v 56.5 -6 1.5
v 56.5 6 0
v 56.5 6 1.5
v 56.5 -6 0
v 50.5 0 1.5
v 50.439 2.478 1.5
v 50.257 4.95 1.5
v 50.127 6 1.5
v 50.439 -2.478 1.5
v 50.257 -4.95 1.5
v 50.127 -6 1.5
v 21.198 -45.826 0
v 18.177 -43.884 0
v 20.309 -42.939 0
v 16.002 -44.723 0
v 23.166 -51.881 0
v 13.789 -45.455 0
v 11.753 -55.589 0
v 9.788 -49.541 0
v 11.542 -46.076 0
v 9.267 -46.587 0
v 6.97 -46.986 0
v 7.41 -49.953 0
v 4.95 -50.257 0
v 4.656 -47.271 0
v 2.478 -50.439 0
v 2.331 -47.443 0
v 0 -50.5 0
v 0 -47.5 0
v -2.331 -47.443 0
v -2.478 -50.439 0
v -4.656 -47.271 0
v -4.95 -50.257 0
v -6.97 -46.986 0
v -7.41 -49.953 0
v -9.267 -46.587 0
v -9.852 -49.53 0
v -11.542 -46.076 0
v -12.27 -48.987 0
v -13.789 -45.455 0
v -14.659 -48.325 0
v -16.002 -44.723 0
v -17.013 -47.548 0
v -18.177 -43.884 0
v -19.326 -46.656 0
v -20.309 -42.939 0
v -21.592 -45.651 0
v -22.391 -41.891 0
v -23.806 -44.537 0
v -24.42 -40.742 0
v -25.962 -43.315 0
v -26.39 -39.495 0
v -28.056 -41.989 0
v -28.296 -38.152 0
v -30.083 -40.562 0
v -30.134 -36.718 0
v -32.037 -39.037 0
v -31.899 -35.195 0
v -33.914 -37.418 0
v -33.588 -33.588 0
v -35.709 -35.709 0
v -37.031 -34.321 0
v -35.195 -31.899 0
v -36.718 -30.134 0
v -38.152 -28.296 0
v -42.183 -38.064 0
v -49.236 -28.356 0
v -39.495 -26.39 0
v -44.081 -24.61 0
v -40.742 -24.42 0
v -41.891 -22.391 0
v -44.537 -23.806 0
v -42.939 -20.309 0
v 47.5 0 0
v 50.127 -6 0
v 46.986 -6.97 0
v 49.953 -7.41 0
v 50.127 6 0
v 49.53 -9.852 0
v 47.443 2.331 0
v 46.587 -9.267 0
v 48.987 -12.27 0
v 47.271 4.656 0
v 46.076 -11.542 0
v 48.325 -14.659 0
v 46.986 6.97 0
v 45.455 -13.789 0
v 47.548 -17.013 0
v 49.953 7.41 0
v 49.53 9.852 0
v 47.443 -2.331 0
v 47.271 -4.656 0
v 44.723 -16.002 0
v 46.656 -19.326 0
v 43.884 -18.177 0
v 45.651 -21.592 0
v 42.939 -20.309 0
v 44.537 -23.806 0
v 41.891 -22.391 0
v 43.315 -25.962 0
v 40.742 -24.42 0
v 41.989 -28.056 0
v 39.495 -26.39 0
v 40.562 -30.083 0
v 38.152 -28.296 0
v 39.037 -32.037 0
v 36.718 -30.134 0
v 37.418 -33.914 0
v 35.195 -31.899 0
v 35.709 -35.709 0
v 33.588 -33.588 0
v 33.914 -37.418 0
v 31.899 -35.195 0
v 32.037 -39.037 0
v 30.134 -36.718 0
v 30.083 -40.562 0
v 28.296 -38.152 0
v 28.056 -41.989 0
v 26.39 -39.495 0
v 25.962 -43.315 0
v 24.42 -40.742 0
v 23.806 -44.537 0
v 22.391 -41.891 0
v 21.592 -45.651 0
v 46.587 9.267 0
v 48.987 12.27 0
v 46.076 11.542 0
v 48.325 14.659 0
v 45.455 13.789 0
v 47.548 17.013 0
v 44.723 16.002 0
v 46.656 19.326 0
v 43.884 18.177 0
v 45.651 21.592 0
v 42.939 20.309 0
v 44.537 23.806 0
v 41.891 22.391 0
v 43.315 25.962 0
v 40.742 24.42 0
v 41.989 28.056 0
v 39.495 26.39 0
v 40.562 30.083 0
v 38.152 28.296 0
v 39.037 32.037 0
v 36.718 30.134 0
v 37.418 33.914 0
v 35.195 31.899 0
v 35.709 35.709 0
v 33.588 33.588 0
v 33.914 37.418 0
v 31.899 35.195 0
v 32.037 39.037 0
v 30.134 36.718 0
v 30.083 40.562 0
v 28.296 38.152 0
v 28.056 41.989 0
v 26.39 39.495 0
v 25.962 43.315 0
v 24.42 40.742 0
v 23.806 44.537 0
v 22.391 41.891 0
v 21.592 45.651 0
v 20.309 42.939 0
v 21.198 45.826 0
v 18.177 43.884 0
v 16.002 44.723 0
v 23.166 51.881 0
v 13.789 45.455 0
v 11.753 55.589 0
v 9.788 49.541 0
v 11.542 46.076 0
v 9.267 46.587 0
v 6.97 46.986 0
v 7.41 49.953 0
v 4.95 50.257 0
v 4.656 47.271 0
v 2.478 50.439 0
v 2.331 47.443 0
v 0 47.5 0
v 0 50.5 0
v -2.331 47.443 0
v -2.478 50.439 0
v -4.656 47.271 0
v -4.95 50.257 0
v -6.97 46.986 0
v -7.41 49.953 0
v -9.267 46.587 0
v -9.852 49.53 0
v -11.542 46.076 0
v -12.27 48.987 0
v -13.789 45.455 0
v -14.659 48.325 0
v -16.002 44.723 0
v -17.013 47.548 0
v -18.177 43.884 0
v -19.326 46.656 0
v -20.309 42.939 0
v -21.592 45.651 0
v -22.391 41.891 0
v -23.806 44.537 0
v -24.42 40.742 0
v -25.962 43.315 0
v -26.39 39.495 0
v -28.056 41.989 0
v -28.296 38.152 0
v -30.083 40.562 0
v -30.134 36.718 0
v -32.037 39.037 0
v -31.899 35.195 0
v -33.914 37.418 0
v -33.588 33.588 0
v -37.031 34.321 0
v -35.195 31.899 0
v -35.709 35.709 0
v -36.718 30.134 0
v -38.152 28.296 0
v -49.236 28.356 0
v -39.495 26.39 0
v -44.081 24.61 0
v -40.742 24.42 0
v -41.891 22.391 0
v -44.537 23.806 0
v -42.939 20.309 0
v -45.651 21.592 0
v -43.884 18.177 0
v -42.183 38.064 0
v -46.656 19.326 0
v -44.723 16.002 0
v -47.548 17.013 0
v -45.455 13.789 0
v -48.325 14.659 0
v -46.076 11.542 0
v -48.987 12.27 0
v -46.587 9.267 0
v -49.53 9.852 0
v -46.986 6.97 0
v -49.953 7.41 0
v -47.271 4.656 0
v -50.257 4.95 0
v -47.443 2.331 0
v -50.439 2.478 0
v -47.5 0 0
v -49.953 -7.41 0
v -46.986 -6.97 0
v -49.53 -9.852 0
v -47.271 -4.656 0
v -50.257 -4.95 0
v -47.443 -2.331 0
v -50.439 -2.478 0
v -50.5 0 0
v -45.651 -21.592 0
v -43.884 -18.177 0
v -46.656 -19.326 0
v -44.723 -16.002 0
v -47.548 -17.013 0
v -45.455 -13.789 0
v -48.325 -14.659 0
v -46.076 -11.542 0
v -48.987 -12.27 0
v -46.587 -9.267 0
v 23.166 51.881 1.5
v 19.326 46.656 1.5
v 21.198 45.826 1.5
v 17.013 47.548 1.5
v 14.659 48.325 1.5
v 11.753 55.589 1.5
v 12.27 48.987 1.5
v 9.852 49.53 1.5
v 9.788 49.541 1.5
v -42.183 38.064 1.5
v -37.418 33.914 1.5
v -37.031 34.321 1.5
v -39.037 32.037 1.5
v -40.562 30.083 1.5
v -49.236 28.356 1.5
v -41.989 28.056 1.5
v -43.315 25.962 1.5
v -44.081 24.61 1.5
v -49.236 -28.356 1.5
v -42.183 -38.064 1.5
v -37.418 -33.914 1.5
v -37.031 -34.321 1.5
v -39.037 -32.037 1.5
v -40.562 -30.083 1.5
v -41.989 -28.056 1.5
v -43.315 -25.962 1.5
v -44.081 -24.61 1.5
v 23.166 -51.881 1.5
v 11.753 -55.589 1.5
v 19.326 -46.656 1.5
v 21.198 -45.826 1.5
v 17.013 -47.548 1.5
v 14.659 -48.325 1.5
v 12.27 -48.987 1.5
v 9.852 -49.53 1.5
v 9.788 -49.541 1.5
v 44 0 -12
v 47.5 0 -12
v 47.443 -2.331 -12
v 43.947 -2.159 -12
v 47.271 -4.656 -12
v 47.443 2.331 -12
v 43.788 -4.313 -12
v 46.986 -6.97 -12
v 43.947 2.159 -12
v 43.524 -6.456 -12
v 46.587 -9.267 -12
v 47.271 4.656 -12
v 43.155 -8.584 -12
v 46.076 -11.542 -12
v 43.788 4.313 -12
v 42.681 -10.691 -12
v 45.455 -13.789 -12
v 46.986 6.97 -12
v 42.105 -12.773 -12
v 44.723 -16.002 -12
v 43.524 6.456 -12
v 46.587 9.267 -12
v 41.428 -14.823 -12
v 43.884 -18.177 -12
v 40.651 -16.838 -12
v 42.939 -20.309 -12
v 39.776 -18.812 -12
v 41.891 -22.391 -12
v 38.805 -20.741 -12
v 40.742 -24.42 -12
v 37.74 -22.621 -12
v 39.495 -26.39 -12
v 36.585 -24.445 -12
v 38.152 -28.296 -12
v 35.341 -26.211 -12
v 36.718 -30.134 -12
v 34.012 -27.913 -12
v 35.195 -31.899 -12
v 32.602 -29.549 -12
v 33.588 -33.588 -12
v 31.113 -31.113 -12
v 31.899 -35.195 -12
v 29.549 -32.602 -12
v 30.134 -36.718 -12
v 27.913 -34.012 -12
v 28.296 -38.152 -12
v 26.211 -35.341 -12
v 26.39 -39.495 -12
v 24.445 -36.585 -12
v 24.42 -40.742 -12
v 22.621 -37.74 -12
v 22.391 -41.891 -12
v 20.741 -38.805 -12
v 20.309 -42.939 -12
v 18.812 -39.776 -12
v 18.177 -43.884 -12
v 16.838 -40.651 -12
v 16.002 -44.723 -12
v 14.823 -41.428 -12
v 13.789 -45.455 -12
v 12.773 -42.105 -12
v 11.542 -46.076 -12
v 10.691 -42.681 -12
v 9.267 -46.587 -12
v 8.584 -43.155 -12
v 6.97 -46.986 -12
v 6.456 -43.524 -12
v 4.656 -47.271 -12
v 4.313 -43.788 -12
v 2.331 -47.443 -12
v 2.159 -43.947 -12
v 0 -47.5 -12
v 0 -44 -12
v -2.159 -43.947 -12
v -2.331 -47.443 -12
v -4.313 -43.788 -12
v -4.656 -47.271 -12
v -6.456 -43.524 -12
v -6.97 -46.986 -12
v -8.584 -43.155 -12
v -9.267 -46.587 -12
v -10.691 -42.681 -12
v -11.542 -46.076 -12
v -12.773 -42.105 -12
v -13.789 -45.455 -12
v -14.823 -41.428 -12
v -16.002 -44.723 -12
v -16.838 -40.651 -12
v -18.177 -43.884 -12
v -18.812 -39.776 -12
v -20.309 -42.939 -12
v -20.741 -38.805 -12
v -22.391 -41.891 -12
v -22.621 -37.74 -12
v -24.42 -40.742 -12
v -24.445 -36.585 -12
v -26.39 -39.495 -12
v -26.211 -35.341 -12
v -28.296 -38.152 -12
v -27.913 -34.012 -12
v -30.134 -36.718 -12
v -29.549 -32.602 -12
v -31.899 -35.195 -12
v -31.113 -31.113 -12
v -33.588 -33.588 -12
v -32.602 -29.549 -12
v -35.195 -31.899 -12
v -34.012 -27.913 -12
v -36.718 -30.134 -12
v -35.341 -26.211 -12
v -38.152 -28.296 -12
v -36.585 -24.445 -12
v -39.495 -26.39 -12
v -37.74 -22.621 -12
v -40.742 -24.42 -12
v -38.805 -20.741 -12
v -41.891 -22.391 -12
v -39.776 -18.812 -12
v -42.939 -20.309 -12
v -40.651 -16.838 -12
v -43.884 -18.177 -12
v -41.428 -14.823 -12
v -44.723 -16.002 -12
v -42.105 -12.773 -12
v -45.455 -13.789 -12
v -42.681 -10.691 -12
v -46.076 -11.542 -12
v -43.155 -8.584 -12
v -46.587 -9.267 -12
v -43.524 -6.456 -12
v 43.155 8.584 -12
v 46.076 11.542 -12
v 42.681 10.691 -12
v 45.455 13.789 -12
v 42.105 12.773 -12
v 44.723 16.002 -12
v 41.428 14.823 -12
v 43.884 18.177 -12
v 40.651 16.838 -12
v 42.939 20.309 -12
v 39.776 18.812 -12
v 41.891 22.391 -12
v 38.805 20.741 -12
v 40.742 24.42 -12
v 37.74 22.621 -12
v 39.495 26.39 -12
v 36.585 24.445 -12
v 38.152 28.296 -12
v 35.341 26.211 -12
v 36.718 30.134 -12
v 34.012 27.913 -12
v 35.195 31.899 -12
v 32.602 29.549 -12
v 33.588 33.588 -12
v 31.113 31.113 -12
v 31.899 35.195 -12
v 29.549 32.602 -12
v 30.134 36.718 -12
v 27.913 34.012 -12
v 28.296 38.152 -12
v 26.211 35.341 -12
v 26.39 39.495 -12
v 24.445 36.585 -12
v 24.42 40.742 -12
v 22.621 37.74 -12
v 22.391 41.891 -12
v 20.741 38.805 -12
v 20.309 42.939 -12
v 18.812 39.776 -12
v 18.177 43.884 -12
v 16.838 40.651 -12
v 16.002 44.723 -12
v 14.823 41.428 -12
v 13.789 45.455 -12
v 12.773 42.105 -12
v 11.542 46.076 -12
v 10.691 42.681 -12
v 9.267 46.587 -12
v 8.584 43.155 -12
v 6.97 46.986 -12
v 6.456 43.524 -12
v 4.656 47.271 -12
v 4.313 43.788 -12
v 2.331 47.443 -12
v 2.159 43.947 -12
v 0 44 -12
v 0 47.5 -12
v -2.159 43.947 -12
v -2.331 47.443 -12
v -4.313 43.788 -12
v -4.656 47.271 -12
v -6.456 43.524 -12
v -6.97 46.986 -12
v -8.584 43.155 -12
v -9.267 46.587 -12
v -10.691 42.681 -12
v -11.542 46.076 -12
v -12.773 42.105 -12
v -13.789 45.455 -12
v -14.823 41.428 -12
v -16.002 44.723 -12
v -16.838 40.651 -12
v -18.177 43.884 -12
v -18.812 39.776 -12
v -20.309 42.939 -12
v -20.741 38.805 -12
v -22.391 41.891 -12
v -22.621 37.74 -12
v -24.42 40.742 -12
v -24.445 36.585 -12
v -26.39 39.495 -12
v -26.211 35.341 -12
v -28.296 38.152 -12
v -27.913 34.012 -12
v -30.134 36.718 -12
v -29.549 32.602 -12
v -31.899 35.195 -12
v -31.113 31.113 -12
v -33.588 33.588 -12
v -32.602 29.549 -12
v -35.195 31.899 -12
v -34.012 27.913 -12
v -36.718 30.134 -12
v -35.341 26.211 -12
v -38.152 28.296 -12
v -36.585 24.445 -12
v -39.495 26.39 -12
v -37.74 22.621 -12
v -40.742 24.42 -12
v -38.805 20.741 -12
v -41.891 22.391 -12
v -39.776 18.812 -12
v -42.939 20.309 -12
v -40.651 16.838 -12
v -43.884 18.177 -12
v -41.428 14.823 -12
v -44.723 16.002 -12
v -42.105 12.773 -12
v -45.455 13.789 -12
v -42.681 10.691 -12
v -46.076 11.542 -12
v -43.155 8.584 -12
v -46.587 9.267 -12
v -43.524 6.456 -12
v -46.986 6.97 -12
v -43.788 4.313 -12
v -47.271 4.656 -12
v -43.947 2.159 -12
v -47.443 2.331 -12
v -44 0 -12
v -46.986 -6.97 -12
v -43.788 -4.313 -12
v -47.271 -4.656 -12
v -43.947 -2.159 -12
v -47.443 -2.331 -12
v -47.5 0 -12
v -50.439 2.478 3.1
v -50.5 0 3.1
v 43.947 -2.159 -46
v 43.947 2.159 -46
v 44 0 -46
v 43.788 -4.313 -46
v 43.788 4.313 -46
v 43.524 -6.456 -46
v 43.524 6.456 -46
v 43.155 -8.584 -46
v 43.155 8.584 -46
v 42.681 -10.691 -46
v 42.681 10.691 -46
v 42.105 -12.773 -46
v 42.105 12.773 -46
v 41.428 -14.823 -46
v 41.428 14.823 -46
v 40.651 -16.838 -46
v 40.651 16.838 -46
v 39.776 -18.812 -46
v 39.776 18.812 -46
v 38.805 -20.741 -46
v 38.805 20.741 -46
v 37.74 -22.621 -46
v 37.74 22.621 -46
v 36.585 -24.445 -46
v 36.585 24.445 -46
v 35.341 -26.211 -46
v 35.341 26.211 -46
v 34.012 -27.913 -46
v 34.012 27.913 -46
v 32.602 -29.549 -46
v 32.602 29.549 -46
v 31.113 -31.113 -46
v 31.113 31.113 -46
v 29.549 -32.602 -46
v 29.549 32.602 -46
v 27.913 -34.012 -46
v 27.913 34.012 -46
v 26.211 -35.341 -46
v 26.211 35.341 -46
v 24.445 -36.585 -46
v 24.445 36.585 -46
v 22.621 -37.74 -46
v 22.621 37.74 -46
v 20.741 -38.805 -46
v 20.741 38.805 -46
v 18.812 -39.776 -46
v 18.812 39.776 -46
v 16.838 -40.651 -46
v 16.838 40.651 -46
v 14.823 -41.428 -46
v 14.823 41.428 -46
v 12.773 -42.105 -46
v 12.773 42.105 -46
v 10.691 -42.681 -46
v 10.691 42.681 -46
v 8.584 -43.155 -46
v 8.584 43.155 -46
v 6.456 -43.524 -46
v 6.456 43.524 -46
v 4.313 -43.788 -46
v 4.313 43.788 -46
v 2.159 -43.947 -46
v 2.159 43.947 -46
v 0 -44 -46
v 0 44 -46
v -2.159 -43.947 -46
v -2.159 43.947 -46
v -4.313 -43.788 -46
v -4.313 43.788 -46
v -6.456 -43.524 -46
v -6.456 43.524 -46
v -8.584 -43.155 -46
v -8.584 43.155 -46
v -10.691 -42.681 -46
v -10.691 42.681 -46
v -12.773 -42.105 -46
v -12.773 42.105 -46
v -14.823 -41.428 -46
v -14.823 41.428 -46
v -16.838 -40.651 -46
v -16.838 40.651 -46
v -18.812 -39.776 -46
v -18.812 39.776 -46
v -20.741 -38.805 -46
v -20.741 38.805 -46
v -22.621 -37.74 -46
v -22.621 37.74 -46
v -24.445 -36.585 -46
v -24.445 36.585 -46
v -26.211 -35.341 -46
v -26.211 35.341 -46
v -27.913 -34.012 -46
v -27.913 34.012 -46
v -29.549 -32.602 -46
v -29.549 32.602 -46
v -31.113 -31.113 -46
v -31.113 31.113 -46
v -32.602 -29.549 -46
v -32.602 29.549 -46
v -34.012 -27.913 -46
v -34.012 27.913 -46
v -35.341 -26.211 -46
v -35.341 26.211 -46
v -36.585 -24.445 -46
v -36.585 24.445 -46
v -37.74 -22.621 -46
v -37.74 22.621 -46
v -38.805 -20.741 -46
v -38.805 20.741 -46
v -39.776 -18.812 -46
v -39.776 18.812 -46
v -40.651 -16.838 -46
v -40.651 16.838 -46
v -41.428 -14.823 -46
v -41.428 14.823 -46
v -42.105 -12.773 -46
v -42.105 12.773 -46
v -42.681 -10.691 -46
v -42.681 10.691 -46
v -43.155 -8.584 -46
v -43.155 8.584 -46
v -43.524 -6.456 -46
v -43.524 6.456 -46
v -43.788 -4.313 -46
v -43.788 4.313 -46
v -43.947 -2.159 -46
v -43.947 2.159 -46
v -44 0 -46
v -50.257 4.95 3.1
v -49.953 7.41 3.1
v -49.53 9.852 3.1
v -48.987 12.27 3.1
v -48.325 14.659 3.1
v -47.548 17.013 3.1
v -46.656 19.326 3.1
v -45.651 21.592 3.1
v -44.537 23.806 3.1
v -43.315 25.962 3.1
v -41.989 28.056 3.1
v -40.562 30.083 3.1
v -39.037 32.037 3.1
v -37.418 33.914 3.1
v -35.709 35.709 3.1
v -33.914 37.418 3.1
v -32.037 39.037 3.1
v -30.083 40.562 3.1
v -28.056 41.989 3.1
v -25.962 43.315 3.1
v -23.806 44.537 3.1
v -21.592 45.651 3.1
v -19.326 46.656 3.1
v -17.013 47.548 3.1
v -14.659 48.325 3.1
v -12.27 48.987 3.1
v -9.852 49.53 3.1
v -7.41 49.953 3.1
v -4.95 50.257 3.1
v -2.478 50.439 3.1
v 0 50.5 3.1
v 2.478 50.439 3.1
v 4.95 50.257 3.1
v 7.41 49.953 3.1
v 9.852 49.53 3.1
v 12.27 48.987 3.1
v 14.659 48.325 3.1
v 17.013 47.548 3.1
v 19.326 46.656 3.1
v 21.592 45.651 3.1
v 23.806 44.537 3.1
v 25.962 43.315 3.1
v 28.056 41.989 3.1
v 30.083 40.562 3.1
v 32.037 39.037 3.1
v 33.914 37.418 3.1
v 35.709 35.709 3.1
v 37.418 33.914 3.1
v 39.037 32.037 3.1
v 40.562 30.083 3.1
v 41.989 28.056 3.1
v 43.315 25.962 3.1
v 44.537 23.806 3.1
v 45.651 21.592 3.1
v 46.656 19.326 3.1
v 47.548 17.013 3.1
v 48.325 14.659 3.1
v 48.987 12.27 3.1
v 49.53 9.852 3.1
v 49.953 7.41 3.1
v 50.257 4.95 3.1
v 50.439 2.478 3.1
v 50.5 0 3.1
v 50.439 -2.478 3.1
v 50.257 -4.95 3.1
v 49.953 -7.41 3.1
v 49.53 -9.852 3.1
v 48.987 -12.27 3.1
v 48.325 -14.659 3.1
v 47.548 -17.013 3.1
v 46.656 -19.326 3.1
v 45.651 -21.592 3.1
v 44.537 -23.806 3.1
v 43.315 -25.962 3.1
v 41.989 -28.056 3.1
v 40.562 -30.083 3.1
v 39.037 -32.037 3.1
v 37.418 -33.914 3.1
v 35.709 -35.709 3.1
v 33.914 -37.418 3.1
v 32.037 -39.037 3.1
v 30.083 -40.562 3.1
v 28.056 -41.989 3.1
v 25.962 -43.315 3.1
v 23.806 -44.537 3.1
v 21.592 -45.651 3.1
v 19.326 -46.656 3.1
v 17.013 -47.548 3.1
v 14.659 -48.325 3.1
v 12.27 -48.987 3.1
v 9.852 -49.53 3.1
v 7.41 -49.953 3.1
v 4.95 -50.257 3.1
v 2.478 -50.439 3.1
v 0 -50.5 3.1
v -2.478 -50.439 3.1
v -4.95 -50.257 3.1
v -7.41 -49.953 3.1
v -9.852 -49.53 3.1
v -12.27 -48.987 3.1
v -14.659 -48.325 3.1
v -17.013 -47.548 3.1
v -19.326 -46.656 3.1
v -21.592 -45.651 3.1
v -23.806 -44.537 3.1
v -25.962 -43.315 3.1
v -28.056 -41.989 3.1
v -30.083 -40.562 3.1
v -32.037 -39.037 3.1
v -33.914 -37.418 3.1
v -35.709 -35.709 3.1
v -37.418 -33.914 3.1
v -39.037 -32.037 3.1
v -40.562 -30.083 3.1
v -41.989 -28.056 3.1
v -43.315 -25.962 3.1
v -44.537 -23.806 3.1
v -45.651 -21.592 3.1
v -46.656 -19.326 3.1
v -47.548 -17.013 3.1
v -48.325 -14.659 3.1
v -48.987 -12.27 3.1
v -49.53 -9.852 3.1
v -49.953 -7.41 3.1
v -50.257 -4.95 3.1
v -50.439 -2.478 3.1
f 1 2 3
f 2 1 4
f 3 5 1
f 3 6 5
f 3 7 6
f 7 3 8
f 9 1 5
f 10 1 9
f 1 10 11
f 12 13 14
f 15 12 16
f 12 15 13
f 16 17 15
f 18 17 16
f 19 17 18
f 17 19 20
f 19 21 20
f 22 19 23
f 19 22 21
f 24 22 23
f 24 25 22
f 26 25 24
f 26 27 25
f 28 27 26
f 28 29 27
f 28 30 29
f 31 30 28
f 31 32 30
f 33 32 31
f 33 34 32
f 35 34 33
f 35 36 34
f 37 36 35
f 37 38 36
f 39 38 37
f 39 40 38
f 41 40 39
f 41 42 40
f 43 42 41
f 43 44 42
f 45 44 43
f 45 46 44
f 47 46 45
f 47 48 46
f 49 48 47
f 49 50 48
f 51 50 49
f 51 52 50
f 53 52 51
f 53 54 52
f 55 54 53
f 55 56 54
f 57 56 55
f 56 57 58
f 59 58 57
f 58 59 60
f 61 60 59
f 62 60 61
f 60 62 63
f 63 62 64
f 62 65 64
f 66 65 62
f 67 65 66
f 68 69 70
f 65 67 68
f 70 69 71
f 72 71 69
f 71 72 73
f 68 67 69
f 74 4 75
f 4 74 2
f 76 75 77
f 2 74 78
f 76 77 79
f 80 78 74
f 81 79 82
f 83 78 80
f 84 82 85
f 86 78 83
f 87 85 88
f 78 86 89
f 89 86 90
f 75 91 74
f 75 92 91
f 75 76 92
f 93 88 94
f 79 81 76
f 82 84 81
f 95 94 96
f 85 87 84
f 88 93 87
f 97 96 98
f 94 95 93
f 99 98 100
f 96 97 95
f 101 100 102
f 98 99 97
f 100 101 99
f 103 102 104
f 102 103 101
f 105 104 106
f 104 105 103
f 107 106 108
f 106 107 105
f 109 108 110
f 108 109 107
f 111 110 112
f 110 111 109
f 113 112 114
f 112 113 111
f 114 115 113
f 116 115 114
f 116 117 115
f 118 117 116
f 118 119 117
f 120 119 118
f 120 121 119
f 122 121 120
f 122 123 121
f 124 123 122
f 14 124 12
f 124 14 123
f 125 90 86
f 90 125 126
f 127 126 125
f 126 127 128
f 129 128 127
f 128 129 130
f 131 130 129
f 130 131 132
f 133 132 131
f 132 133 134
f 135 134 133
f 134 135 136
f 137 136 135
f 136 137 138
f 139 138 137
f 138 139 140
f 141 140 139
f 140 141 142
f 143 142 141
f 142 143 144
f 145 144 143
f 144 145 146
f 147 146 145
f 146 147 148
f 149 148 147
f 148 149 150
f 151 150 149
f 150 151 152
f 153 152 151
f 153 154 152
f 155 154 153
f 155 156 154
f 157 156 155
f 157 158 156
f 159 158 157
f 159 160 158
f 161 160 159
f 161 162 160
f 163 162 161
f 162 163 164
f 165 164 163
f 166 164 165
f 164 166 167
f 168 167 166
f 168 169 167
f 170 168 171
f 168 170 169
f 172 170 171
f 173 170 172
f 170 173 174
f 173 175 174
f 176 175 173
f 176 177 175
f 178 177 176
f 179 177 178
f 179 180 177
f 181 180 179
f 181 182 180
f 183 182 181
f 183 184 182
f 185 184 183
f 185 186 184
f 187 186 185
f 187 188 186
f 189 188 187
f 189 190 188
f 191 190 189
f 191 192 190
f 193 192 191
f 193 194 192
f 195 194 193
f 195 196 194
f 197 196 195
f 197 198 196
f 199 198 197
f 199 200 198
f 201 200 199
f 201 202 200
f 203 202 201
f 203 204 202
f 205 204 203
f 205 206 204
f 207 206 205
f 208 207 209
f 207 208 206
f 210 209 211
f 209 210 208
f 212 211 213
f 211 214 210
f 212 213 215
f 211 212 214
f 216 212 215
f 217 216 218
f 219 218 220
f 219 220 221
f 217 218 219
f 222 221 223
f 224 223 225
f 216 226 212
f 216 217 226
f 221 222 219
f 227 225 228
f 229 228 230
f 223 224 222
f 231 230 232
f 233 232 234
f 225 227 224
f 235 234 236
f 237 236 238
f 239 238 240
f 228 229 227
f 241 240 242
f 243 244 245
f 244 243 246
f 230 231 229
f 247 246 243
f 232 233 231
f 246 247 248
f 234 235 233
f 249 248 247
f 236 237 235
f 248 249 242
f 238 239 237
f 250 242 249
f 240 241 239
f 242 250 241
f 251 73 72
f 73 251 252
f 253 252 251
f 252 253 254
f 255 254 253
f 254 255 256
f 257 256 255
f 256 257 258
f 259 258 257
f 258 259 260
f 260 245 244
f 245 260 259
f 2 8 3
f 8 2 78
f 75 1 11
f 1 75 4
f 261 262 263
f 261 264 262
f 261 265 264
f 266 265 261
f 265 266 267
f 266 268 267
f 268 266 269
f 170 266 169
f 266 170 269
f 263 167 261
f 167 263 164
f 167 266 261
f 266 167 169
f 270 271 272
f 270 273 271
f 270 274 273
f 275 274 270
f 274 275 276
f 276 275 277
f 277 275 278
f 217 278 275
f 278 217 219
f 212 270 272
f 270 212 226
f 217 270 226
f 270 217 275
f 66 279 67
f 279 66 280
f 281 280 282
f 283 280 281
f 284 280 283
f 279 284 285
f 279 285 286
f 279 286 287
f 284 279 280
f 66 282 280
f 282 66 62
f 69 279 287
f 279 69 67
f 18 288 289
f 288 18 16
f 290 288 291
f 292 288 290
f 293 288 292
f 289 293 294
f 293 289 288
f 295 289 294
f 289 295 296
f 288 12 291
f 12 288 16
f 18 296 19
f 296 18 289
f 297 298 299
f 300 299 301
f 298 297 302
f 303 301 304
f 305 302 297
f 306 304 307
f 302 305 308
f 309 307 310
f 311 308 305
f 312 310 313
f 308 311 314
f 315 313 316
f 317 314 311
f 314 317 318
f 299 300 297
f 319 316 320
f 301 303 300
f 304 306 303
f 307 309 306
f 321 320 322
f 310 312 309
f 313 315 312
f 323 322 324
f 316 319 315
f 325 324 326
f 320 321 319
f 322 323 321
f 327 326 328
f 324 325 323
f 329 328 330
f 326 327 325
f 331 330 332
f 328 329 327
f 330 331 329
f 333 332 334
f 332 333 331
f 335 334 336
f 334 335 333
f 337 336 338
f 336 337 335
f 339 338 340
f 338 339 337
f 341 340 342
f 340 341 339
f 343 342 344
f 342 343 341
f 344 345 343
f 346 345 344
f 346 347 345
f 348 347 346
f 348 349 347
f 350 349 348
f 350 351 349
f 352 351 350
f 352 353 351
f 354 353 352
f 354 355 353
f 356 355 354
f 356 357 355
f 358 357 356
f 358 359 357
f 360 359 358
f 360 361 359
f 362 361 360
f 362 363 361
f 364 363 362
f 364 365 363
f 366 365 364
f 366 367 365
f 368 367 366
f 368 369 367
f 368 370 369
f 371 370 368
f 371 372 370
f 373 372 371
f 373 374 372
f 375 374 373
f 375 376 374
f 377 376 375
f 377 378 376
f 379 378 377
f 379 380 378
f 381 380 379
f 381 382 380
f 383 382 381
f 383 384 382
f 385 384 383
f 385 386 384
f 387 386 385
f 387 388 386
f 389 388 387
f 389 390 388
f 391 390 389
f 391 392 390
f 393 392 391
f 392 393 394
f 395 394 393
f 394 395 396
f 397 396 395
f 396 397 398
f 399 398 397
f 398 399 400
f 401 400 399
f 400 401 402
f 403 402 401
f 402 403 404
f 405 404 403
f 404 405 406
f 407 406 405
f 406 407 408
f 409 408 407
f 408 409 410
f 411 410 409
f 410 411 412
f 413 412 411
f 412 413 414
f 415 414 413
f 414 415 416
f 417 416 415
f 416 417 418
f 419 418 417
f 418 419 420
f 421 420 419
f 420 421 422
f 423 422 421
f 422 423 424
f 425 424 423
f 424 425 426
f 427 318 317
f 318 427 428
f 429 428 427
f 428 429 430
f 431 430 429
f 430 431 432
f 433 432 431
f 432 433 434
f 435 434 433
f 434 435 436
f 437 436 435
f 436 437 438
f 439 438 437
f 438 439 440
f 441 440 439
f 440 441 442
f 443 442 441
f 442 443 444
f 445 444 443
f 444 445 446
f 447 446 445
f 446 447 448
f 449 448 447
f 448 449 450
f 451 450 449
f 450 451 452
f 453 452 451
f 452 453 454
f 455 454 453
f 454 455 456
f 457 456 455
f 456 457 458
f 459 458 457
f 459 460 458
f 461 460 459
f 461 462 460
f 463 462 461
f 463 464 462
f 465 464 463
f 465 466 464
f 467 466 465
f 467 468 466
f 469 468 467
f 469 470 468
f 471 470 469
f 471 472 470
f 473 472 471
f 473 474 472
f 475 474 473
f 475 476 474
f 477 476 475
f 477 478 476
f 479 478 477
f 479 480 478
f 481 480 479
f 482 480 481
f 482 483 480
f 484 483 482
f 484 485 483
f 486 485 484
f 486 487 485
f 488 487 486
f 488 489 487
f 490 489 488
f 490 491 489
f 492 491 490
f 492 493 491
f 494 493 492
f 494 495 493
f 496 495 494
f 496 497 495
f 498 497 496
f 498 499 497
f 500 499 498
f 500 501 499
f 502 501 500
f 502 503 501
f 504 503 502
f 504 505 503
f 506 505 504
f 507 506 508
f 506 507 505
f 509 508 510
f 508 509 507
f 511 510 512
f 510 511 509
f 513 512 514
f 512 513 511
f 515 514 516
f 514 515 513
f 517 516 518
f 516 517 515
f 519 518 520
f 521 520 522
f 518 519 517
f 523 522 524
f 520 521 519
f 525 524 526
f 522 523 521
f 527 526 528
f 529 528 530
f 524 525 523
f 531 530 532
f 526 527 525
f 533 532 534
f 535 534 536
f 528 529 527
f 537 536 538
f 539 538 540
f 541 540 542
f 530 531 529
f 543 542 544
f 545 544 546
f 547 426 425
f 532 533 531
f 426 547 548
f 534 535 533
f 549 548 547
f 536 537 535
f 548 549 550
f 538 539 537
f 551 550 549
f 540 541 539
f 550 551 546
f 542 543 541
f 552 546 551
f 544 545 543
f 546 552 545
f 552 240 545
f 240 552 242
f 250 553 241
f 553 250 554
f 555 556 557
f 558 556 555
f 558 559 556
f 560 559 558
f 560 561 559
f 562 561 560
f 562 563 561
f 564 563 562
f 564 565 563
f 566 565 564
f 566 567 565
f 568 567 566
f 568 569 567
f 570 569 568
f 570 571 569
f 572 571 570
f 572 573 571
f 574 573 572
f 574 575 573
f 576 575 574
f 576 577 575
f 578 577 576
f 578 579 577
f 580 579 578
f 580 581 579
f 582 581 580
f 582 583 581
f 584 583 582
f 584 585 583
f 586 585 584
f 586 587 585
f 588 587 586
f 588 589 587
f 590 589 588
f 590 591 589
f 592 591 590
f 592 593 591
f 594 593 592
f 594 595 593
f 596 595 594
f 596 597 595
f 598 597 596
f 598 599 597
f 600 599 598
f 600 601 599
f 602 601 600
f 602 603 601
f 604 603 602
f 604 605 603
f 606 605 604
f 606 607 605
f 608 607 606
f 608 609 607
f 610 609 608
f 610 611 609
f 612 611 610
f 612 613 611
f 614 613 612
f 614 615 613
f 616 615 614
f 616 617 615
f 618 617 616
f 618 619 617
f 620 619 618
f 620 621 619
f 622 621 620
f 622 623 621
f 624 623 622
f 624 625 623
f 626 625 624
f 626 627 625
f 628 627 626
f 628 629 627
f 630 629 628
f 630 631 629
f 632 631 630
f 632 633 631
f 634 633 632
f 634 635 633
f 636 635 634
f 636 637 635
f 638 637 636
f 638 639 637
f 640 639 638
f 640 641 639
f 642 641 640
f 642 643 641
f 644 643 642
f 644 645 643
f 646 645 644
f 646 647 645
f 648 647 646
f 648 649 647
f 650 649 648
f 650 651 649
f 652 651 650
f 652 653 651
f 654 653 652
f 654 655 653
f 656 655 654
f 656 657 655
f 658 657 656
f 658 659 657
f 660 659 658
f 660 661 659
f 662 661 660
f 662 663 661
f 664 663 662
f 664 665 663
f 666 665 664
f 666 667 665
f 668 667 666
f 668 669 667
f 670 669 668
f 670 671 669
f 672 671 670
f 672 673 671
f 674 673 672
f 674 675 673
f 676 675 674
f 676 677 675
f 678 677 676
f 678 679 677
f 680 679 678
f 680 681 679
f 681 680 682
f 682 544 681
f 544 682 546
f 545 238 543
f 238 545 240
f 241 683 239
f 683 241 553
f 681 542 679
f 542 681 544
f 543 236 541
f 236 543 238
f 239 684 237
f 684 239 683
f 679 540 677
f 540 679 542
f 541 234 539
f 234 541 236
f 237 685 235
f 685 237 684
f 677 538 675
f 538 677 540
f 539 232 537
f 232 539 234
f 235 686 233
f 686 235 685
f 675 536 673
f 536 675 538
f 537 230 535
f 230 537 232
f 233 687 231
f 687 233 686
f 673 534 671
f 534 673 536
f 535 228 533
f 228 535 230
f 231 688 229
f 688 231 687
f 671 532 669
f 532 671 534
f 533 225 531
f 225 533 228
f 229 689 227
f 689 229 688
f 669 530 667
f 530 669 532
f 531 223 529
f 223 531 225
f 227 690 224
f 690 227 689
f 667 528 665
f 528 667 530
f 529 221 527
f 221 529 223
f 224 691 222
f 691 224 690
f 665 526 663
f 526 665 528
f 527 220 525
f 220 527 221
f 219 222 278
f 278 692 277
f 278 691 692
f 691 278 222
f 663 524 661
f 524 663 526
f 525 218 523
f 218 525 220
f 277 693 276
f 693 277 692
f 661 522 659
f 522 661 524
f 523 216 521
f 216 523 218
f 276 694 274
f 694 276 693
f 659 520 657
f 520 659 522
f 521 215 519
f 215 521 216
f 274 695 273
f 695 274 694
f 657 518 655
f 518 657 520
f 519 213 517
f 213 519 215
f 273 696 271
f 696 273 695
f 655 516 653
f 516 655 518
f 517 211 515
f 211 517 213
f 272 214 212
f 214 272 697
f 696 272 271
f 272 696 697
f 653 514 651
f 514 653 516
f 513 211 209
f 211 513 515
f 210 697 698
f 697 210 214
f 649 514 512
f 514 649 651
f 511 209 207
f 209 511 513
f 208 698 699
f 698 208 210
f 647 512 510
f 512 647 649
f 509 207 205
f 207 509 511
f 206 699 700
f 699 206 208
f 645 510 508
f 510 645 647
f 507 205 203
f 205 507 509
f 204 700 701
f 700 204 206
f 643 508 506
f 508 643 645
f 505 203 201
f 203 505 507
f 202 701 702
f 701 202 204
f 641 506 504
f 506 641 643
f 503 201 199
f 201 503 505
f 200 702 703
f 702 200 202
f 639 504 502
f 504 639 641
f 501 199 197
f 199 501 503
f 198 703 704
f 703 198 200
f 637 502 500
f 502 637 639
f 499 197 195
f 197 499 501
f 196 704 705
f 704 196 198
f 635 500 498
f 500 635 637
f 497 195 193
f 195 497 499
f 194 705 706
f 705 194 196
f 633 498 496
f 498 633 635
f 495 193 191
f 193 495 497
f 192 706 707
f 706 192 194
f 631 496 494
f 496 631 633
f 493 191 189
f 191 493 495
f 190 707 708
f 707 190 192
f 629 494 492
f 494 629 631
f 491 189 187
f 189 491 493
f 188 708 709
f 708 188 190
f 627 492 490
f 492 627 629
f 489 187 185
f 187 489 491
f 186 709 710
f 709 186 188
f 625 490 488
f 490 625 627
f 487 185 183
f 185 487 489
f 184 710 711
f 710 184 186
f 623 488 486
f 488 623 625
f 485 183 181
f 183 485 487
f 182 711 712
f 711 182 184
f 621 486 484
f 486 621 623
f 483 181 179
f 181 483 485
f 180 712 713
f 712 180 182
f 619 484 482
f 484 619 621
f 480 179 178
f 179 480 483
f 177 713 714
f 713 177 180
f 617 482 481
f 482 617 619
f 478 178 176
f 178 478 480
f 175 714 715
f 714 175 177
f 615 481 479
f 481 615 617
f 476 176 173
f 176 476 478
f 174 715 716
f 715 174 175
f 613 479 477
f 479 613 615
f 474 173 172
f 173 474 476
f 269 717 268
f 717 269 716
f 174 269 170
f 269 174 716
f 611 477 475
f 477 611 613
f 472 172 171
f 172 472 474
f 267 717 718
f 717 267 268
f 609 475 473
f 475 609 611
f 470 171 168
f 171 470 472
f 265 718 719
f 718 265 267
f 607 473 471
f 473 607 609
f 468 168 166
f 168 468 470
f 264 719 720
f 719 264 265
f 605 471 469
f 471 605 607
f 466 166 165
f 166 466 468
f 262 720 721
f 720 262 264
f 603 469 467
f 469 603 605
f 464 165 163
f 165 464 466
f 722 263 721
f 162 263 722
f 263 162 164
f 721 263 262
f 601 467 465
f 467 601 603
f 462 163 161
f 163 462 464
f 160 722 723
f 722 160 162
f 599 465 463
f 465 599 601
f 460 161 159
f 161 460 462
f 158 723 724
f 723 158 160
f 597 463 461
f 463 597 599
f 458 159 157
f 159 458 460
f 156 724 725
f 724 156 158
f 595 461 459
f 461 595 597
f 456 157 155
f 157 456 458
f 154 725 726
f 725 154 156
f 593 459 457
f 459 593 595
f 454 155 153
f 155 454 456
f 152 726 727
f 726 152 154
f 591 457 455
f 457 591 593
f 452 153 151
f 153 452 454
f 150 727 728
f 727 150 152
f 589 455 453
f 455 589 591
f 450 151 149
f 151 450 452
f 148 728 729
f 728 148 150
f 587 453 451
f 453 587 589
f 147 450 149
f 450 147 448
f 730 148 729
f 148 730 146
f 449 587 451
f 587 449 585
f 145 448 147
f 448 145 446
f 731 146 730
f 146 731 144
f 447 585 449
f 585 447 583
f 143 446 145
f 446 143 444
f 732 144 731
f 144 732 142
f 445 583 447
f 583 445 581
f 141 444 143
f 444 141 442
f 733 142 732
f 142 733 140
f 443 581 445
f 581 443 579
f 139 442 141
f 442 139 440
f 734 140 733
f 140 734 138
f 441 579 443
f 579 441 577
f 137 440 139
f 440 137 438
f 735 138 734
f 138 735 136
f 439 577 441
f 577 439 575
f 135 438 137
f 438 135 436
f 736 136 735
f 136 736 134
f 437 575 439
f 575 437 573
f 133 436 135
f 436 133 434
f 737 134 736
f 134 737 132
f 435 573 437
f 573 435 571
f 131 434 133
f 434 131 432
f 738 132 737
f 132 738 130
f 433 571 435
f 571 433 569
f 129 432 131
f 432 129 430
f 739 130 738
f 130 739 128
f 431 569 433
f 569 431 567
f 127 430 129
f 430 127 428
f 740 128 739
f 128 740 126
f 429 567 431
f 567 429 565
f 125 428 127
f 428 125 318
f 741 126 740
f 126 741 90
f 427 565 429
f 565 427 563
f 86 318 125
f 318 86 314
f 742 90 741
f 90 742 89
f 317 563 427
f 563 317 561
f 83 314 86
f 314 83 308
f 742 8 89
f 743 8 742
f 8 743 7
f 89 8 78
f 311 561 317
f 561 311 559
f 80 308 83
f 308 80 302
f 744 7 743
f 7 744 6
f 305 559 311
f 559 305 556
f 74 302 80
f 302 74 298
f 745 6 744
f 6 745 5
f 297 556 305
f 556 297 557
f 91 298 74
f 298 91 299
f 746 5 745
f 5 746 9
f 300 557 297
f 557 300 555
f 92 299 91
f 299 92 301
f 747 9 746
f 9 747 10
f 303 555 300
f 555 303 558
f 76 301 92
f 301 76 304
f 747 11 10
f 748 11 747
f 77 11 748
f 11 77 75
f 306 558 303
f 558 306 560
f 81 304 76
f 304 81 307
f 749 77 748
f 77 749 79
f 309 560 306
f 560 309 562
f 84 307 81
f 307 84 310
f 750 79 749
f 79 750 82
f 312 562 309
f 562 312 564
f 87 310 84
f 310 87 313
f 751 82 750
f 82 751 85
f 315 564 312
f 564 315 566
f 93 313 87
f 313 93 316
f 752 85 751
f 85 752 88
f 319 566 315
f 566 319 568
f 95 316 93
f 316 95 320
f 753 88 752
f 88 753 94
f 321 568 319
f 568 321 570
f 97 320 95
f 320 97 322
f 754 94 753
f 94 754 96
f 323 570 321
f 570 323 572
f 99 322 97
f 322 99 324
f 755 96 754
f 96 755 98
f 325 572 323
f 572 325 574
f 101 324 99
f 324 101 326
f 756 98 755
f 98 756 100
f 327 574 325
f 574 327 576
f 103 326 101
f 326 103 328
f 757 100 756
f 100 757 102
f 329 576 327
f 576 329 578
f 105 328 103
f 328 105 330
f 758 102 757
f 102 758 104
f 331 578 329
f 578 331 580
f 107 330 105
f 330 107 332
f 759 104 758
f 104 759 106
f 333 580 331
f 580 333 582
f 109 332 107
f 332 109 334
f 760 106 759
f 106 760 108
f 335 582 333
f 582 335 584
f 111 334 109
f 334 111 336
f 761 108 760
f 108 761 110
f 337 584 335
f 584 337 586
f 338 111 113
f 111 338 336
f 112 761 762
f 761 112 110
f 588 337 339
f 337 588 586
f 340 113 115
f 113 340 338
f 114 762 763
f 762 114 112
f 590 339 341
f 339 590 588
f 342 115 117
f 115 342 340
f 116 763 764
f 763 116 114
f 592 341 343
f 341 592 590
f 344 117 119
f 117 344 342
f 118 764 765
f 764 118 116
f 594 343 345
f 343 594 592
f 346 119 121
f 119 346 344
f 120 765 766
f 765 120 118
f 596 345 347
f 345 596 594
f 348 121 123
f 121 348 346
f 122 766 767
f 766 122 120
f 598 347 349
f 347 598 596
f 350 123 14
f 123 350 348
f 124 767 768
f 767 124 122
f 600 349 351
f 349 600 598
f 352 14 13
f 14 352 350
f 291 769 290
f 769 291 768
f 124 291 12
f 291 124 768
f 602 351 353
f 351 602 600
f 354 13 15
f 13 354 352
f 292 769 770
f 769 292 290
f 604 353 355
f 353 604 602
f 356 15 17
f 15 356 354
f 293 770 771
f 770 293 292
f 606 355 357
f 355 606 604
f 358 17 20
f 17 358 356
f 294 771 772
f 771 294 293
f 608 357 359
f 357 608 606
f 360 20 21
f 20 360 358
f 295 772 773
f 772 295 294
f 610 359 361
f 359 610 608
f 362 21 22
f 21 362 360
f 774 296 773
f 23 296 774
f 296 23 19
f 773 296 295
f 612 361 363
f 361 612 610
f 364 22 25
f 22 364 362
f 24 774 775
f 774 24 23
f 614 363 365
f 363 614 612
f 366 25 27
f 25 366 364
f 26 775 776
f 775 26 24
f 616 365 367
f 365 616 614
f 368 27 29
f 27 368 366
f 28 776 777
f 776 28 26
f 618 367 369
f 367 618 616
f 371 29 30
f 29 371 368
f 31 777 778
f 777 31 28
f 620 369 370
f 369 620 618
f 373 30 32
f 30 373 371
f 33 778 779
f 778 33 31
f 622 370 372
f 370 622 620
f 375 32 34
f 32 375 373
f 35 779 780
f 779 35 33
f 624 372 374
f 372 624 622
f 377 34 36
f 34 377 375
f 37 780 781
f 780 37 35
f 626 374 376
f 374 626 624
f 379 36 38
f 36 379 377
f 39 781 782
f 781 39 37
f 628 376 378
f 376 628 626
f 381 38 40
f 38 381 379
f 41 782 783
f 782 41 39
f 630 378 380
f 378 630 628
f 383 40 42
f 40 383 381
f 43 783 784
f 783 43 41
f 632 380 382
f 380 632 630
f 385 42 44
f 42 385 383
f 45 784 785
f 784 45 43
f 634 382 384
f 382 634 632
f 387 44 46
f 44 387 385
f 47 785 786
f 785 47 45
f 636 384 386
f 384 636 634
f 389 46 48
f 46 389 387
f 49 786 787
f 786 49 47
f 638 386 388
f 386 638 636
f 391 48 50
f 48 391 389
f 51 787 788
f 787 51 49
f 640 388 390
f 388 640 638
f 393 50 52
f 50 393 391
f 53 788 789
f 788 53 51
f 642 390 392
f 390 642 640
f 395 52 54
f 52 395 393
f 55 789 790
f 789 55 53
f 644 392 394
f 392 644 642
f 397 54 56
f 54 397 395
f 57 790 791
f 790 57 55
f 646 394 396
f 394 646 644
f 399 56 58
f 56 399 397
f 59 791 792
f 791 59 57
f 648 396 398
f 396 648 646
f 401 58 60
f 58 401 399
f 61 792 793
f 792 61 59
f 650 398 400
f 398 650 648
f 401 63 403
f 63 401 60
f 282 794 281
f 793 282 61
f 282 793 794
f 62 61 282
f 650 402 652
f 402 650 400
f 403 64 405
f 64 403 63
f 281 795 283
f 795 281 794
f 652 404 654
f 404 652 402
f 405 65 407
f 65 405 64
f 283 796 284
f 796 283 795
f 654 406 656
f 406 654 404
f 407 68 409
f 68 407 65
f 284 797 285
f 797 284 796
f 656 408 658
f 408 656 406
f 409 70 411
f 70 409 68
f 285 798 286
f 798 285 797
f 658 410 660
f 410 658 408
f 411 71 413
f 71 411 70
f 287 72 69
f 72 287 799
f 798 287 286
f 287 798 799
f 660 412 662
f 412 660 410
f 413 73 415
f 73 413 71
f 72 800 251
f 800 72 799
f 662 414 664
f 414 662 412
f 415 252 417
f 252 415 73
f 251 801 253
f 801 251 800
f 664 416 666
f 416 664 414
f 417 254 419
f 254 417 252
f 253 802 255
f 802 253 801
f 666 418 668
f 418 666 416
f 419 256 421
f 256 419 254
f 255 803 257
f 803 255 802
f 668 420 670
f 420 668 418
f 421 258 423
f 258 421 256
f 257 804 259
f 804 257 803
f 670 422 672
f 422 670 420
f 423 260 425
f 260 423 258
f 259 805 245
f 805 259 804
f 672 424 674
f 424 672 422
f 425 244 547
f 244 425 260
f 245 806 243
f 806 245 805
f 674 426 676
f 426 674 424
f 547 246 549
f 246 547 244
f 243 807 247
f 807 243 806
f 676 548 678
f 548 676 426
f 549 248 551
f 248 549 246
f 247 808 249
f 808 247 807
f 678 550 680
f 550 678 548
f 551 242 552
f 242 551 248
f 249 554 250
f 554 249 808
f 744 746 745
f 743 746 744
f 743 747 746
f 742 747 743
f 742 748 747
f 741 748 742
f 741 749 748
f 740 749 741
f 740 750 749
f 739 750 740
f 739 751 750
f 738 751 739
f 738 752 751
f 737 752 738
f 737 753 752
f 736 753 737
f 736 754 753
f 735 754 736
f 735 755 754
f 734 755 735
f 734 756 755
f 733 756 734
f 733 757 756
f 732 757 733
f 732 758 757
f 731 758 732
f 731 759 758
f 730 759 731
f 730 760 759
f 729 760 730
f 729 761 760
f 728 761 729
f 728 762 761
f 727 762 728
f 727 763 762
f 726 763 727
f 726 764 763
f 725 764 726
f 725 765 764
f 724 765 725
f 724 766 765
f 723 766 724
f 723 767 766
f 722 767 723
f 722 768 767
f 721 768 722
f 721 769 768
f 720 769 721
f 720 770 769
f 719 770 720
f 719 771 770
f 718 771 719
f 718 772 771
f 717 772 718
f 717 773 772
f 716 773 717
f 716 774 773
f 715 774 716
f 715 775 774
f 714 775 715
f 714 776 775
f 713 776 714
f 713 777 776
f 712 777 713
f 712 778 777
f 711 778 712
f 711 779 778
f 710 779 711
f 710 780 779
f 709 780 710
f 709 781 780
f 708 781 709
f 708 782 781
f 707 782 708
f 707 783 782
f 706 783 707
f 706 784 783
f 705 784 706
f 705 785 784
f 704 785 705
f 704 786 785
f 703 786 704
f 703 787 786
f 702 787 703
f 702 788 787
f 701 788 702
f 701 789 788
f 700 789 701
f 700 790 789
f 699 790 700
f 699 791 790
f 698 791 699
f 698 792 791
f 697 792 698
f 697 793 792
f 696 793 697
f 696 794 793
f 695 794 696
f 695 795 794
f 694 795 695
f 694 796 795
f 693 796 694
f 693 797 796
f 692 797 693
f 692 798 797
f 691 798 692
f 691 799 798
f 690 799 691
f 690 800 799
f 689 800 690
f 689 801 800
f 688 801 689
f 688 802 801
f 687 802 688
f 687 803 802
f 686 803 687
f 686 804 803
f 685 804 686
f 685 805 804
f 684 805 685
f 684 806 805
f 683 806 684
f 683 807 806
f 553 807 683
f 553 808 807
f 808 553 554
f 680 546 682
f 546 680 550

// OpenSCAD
// Simplified solid clearance models of the Alpine S2-S40C drivers, from the scans.
// mm; z = 0 is the mounting surface (back of the flange), +z toward the front.
// part = "woofer" or "tweeter"
part = "woofer";
$fn = 128;
module woofer() {
    rotate_extrude() polygon([[0, 3.1], [50.5, 3.1], [50.5, 0],    // frame ring, 101 mm, 3.1 mm proud
                              [47.5, 0], [47.5, -12], [44, -12],   // basket
                              [44, -46], [0, -46]]);               // motor, 87-88 mm, 46 mm behind
    for (a = [0:72:359]) rotate(a) translate([50, -6, 0]) cube([6.5, 12, 1.5]);   // five ears to 113 mm
}
module tweeter() {
    rotate_extrude() polygon([[0, 7], [24, 7], [29, 3], [29, 0],   // grilled front, 58 mm flange
                              [26, 0], [26, -19], [0, -19]]);      // 52 mm body, 19 mm behind
}
if (part == "woofer") woofer(); else tweeter();
